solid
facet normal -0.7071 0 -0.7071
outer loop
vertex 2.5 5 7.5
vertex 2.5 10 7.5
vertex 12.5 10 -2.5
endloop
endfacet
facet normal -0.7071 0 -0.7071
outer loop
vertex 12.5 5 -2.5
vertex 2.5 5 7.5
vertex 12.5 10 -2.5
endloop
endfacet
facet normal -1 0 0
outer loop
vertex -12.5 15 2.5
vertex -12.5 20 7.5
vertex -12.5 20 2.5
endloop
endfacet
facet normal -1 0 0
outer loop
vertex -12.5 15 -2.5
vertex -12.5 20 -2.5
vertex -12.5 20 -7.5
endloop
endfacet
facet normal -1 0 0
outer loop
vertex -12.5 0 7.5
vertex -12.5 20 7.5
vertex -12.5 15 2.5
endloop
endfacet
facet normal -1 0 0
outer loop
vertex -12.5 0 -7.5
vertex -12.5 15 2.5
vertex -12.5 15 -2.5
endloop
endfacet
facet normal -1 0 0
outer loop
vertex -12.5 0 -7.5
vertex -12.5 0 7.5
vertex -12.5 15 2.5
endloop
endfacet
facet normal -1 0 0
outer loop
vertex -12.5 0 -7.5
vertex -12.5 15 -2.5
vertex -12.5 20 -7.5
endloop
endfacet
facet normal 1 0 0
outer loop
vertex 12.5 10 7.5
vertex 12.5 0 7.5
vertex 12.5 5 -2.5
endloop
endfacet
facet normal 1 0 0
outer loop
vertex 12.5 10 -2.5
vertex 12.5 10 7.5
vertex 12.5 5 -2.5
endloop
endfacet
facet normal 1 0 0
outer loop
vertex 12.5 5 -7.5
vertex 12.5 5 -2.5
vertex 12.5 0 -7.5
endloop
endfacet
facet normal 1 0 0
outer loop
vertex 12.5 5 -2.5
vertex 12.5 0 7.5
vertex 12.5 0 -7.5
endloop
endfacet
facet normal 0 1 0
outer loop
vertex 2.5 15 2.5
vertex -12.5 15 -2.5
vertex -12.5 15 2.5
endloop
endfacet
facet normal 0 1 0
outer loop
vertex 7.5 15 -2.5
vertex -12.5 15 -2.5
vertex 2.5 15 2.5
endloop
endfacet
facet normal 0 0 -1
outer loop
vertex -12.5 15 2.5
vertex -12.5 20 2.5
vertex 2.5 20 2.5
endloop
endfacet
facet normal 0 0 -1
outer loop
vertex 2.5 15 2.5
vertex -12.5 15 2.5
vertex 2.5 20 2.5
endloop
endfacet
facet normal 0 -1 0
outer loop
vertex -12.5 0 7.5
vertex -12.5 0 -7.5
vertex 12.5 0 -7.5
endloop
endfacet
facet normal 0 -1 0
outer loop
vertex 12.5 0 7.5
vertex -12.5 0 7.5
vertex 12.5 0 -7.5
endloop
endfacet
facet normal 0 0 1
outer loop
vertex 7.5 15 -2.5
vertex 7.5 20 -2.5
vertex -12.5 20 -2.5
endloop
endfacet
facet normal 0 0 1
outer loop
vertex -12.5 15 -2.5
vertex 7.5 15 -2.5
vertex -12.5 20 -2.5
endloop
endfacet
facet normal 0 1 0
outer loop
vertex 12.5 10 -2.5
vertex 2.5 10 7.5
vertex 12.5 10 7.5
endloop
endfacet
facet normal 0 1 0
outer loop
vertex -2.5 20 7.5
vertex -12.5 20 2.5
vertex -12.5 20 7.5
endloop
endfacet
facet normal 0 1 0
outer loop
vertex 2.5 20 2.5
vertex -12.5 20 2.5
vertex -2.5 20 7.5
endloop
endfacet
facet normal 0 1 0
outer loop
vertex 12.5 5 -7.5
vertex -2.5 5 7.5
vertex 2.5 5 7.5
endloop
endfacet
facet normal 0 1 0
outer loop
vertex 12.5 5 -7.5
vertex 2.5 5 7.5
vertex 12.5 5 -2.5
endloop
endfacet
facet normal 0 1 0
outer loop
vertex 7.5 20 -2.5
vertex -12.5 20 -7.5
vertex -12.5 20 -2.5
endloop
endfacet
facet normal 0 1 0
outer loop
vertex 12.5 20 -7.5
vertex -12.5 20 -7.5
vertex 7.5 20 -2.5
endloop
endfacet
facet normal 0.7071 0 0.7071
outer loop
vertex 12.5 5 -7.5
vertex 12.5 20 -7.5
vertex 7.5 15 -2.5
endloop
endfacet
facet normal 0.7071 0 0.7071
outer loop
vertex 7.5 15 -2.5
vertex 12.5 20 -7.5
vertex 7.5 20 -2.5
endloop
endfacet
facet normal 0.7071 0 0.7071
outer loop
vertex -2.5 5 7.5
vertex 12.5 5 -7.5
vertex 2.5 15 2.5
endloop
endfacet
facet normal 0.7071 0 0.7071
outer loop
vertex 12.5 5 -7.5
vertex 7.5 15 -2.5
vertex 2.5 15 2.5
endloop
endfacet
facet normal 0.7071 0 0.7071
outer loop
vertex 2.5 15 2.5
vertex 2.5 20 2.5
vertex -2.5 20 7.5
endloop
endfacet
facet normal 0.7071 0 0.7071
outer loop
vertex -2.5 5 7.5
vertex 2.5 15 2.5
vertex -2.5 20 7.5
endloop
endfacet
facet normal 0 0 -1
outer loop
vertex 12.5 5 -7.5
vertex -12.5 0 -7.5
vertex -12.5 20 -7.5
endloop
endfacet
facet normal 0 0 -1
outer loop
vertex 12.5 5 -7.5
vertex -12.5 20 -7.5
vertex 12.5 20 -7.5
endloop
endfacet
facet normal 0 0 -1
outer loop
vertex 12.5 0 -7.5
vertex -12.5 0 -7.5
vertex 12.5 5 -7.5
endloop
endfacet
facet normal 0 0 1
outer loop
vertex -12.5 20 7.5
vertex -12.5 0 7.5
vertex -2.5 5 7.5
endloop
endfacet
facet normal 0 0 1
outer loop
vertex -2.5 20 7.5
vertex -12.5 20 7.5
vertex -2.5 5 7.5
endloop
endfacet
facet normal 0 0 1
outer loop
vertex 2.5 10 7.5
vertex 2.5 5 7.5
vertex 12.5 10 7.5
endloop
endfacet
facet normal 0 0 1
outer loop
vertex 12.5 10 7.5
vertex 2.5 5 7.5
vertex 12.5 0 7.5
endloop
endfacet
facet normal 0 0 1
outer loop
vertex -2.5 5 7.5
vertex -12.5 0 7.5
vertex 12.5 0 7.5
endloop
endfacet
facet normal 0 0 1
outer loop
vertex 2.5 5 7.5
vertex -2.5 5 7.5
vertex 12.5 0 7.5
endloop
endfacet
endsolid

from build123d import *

# Parameters (mm, degrees)
SKETCH_1_W          = 25
SKETCH_1_H          = 15
EXTRUDE_1_DEPTH     = 20
CUT_EXTRUDE_1_DEPTH = 5
CUT_EXTRUDE_2_DEPTH = 15
CUT_EXTRUDE_3_DEPTH = 10


with BuildPart() as part:
    # 草圖1 → 填料-伸長1 (new body)
    with BuildSketch(Plane(origin=(0, 0, 0), x_dir=(1, 0, 0), z_dir=(0, 1, 0))):
        Rectangle(SKETCH_1_W, SKETCH_1_H)
    extrude(amount=EXTRUDE_1_DEPTH)

    # 草圖3 → 除料-伸長1 (cut)
    with BuildSketch(Plane(origin=(0, 20, 0), x_dir=(1, 0, 0), z_dir=(0, 1, 0))):
        Polygon((-12.5, 2.5), (-12.5, -2.5), (2.5, -2.5), (-2.5, -7.5), (12.5, -7.5), (12.5, 7.5), (7.5, 2.5), align=None)
    extrude(amount=-CUT_EXTRUDE_1_DEPTH, mode=Mode.SUBTRACT)

    # 草圖3<3> → 除料-伸長2 (cut)
    with BuildSketch(Plane(origin=(0, 20, 0), x_dir=(1, 0, 0), z_dir=(0, 1, 0))):
        Polygon((7.5, 2.5), (2.5, -2.5), (-2.5, -7.5), (2.5, -7.5), (12.5, 2.5), (12.5, 7.5), align=None)
    extrude(amount=-CUT_EXTRUDE_2_DEPTH, mode=Mode.SUBTRACT)

    # 草圖3<4> → 除料-伸長3 (cut)
    with BuildSketch(Plane(origin=(0, 20, 0), x_dir=(1, 0, 0), z_dir=(0, 1, 0))):
        Polygon((12.5, 2.5), (2.5, -7.5), (12.5, -7.5), align=None)
    extrude(amount=-CUT_EXTRUDE_3_DEPTH, mode=Mode.SUBTRACT)


solid = part.part
